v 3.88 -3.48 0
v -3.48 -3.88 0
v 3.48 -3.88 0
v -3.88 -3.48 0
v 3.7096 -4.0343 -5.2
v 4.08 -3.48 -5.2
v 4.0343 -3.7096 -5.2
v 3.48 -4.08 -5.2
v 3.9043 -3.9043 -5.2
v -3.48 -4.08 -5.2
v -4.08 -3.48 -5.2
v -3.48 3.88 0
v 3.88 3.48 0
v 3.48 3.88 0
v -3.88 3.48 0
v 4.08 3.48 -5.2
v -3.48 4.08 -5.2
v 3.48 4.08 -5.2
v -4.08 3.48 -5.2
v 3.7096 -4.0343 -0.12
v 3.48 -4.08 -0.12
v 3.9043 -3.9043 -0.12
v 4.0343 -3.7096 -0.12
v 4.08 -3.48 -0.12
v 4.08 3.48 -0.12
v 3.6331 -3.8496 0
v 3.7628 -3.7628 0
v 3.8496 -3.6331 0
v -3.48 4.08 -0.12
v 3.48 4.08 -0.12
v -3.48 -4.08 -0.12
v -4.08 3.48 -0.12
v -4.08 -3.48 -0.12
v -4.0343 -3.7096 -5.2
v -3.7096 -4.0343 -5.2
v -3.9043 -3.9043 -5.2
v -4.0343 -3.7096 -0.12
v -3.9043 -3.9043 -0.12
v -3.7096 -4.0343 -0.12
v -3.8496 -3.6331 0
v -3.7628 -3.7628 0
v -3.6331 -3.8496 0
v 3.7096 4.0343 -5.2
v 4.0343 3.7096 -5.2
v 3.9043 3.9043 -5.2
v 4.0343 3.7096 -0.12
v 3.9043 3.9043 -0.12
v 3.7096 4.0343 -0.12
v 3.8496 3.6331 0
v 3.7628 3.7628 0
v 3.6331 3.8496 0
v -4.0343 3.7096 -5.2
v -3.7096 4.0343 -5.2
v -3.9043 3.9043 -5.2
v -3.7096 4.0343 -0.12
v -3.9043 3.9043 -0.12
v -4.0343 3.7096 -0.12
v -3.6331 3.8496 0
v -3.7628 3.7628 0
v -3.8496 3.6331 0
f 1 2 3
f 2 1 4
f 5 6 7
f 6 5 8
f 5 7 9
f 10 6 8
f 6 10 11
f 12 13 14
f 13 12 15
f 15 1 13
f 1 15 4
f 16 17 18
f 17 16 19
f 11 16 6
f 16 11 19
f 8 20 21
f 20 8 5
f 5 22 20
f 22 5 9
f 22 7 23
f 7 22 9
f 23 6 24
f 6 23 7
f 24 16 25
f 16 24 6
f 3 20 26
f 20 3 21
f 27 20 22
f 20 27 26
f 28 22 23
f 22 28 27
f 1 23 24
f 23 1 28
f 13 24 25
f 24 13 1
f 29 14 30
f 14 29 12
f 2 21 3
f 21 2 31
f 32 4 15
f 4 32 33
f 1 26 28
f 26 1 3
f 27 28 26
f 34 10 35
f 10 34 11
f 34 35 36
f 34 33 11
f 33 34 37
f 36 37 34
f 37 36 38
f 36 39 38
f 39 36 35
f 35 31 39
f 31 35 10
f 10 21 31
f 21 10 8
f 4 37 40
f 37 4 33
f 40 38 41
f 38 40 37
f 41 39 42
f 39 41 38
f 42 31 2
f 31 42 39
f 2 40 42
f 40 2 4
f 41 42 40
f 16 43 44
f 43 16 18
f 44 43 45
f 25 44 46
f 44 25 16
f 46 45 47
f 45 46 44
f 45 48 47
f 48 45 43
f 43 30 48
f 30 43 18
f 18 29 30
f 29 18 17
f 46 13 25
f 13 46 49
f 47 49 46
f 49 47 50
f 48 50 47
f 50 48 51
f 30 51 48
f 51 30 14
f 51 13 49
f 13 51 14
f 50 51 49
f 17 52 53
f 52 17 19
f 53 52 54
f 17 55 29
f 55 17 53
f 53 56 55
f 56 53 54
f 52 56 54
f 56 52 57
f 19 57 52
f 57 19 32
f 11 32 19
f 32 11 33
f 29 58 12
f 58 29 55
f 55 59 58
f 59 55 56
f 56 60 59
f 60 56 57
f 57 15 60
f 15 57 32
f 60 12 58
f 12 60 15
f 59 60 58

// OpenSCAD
// file: ../p/1-4cyli.scad
use <../lib.scad>
function ldraw_lib__1_4cyli() = [
// 0 Cylinder 0.25
// 0 Name: 1-4cyli.dat
// 0 Author: James Jessiman
// 0 !LDRAW_ORG Primitive UPDATE 2012-01
// 0 !LICENSE Licensed under CC BY 2.0 and CC BY 4.0 : see CAreadme.txt
// 
// 0 BFC CERTIFY CCW
  [0,"BFC","CERTIFY"],
  [0,"BFC","CCW"],
// 
// 0 !HISTORY 2002-03-23 [sbliss] Added BFC statement.
// 0 !HISTORY 2002-04-25 [PTadmin] Official Update 2002-02
// 0 !HISTORY 2007-06-22 [PTadmin] Header formatted for Contributor Agreement
// 0 !HISTORY 2008-07-01 [PTadmin] Official Update 2008-01
// 0 !HISTORY 2012-02-16 [Philo] Changed to CCW
// 0 !HISTORY 2012-03-30 [PTadmin] Official Update 2012-01
// 
// 
// 4 16 1 1 0 0.9239 1 0.3827 0.9239 0 0.3827 1 0 0
  [4,16,1,1,0,0.9239,1,0.3827,0.9239,0,0.3827,1,0,0],
// 5 24 1 0 0 1 1 0 0.9239 0 0.3827 1 0 -1
  [5,24,1,0,0,1,1,0,0.9239,0,0.3827,1,0,-1],
// 4 16 0.9239 1 0.3827 0.7071 1 0.7071 0.7071 0 0.7071 0.9239 0 0.3827
  [4,16,0.9239,1,0.3827,0.7071,1,0.7071,0.7071,0,0.7071,0.9239,0,0.3827],
// 5 24 0.9239 0 0.3827 0.9239 1 0.3827 0.7071 0 0.7071 1 0 0
  [5,24,0.9239,0,0.3827,0.9239,1,0.3827,0.7071,0,0.7071,1,0,0],
// 4 16 0.7071 1 0.7071 0.3827 1 0.9239 0.3827 0 0.9239 0.7071 0 0.7071
  [4,16,0.7071,1,0.7071,0.3827,1,0.9239,0.3827,0,0.9239,0.7071,0,0.7071],
// 5 24 0.7071 0 0.7071 0.7071 1 0.7071 0.3827 0 0.9239 0.9239 0 0.3827
  [5,24,0.7071,0,0.7071,0.7071,1,0.7071,0.3827,0,0.9239,0.9239,0,0.3827],
// 4 16 0.3827 1 0.9239 0 1 1 0 0 1 0.3827 0 0.9239
  [4,16,0.3827,1,0.9239,0,1,1,0,0,1,0.3827,0,0.9239],
// 5 24 0.3827 0 0.9239 0.3827 1 0.9239 0 0 1 0.7071 0 0.7071
  [5,24,0.3827,0,0.9239,0.3827,1,0.9239,0,0,1,0.7071,0,0.7071],
// 5 24 0 0 1 0 1 1 0.3827 0 0.9239 -1 0 1
  [5,24,0,0,1,0,1,1,0.3827,0,0.9239,-1,0,1],
];
module ldraw_lib__1_4cyli(step=0, col=false, unit=2/5, alt=false, line=0.2, solid=!$preview)
    makepoly(ldraw_lib__1_4cyli(), step=step, col=col, unit=unit, alt=alt, line=line, solid=solid);
ldraw_lib__1_4cyli(line=0.2);
// file: ../p/rect2p.scad
use <../lib.scad>
function ldraw_lib__rect2p() = [
// 0 Rectangle with 2 Parallel Edges
// 0 Name: rect2p.dat
// 0 Author: Donald Sutter [technog]
// 0 !LDRAW_ORG Primitive UPDATE 2010-01
// 0 !LICENSE Licensed under CC BY 2.0 and CC BY 4.0 : see CAreadme.txt
// 
// 0 BFC CERTIFY CCW
  [0,"BFC","CERTIFY"],
  [0,"BFC","CCW"],
// 
// 0 !HISTORY 2003-08-01 [PTadmin] Official Update 2003-02
// 0 !HISTORY 2007-06-24 [PTadmin] Header formatted for Contributor Agreement
// 0 !HISTORY 2008-07-01 [PTadmin] Official Update 2008-01
// 0 !HISTORY 2010-01-17 [mikeheide] changed winding to CCW
// 0 !HISTORY 2010-04-05 [PTadmin] Official Update 2010-01
// 
// 
// 2 24 1 0 1 -1 0 1
  [2,24,1,0,1,-1,0,1],
// 2 24 -1 0 -1 1 0 -1
  [2,24,-1,0,-1,1,0,-1],
// 4 16 -1 0 1 -1 0 -1 1 0 -1 1 0 1
  [4,16,-1,0,1,-1,0,-1,1,0,-1,1,0,1],
// 0
];
module ldraw_lib__rect2p(step=0, col=false, unit=2/5, alt=false, line=0.2, solid=!$preview)
    makepoly(ldraw_lib__rect2p(), step=step, col=col, unit=unit, alt=alt, line=line, solid=solid);
ldraw_lib__rect2p(line=0.2);
// file: ../p/rect1.scad
use <../lib.scad>
function ldraw_lib__rect1() = [
// 0 Rectangle with 1 Edge
// 0 Name: rect1.dat
// 0 Author: Chris Dee [cwdee]
// 0 !LDRAW_ORG Primitive UPDATE 2010-01
// 0 !LICENSE Licensed under CC BY 2.0 and CC BY 4.0 : see CAreadme.txt
// 
// 0 BFC CERTIFY CCW
  [0,"BFC","CERTIFY"],
  [0,"BFC","CCW"],
// 
// 0 !HISTORY 2003-12-19 [PTadmin] Official Update 2003-03
// 0 !HISTORY 2007-06-24 [PTadmin] Header formatted for Contributor Agreement
// 0 !HISTORY 2008-07-01 [PTadmin] Official Update 2008-01
// 0 !HISTORY 2010-01-17 [mikeheide] changed winding to CCW
// 0 !HISTORY 2010-04-05 [PTadmin] Official Update 2010-01
// 
// 
// 2 24 1 0 -1 1 0 1
  [2,24,1,0,-1,1,0,1],
// 4 16 -1 0 1 -1 0 -1 1 0 -1 1 0 1
  [4,16,-1,0,1,-1,0,-1,1,0,-1,1,0,1],
// 0
];
module ldraw_lib__rect1(step=0, col=false, unit=2/5, alt=false, line=0.2, solid=!$preview)
    makepoly(ldraw_lib__rect1(), step=step, col=col, unit=unit, alt=alt, line=line, solid=solid);
ldraw_lib__rect1(line=0.2);
// file: ../p/1-4edge.scad
use <../lib.scad>
function ldraw_lib__1_4edge() = [
// 0 Circle 0.25
// 0 Name: 1-4edge.dat
// 0 Author: James Jessiman
// 0 !LDRAW_ORG Primitive UPDATE 2017-01
// 0 !LICENSE Licensed under CC BY 2.0 and CC BY 4.0 : see CAreadme.txt
// 
// 0 BFC CERTIFY CCW
  [0,"BFC","CERTIFY"],
  [0,"BFC","CCW"],
// 
// 0 !HISTORY 2007-06-22 [PTadmin] Header formatted for Contributor Agreement
// 0 !HISTORY 2008-07-01 [PTadmin] Official Update 2008-01
// 0 !HISTORY 2017-01-15 [Steffen] BFCed
// 0 !HISTORY 2017-12-30 [PTadmin] Official Update 2017-01
// 
// 
// 2 24 1 0 0 0.9239 0 0.3827
  [2,24,1,0,0,0.9239,0,0.3827],
// 2 24 0.9239 0 0.3827 0.7071 0 0.7071
  [2,24,0.9239,0,0.3827,0.7071,0,0.7071],
// 2 24 0.7071 0 0.7071 0.3827 0 0.9239
  [2,24,0.7071,0,0.7071,0.3827,0,0.9239],
// 2 24 0.3827 0 0.9239 0 0 1
  [2,24,0.3827,0,0.9239,0,0,1],
];
module ldraw_lib__1_4edge(step=0, col=false, unit=2/5, alt=false, line=0.2, solid=!$preview)
    makepoly(ldraw_lib__1_4edge(), step=step, col=col, unit=unit, alt=alt, line=line, solid=solid);
ldraw_lib__1_4edge(line=0.2);
// file: ../p/1-4cylo.scad
use <../lib.scad>
use <1-4cyli.scad>
use <1-4edge.scad>
function ldraw_lib__1_4cylo() = [
// 0 Cylinder Open 0.25
// 0 Name: 1-4cylo.dat
// 0 Author: Max Martin Richter [MMR1988]
// 0 !LDRAW_ORG Primitive UPDATE 2010-03
// 0 !LICENSE Licensed under CC BY 2.0 and CC BY 4.0 : see CAreadme.txt
// 
// 0 BFC CERTIFY CCW
  [0,"BFC","CERTIFY"],
  [0,"BFC","CCW"],
// 
// 0 !HISTORY 2010-12-31 [PTadmin] Official Update 2010-03
// 
// 
// 1 16 0 0 0 1 0 0 0 1 0 0 0 1 1-4edge.dat
  [1,16,0,0,0,1,0,0,0,1,0,0,0,1, ldraw_lib__1_4edge()],
// 1 16 0 1 0 1 0 0 0 1 0 0 0 1 1-4edge.dat
  [1,16,0,1,0,1,0,0,0,1,0,0,0,1, ldraw_lib__1_4edge()],
// 1 16 0 0 0 1 0 0 0 1 0 0 0 1 1-4cyli.dat
  [1,16,0,0,0,1,0,0,0,1,0,0,0,1, ldraw_lib__1_4cyli()],
];
module ldraw_lib__1_4cylo(step=0, col=false, unit=2/5, alt=false, line=0.2, solid=!$preview)
    makepoly(ldraw_lib__1_4cylo(), step=step, col=col, unit=unit, alt=alt, line=line, solid=solid);
ldraw_lib__1_4cylo(line=0.2);
// file: ../p/1-4con2.scad
use <../lib.scad>
function ldraw_lib__1_4con2() = [
// 0 Cone  2 x 0.25
// 0 Name: 1-4con2.dat
// 0 Author: Steve Bliss [sbliss]
// 0 !LDRAW_ORG Primitive UPDATE 2012-01
// 0 !LICENSE Licensed under CC BY 2.0 and CC BY 4.0 : see CAreadme.txt
// 
// 0 BFC CERTIFY CCW
  [0,"BFC","CERTIFY"],
  [0,"BFC","CCW"],
// 
// 0 !HISTORY 1999-07-05 [PTadmin] Official Update 1999-05
// 0 !HISTORY 2002-12-11 [cwdee] Standardised title and made BFC compliant
// 0 !HISTORY 2003-06-28 [pneaster] Added missing conditional line
// 0 !HISTORY 2003-12-19 [PTadmin] Official Update 2003-03
// 0 !HISTORY 2007-06-22 [PTadmin] Header formatted for Contributor Agreement
// 0 !HISTORY 2008-07-01 [PTadmin] Official Update 2008-01
// 0 !HISTORY 2012-02-16 [Philo] Recreated CCW
// 0 !HISTORY 2012-03-30 [PTadmin] Official Update 2012-01
// 
// 
// 4 16 2 1 0 1.8478 1 0.7654 2.7717 0 1.1481 3 0 0
  [4,16,2,1,0,1.8478,1,0.7654,2.7717,0,1.1481,3,0,0],
// 4 16 1.8478 1 0.7654 1.4142 1 1.4142 2.1213 0 2.1213 2.7717 0 1.1481
  [4,16,1.8478,1,0.7654,1.4142,1,1.4142,2.1213,0,2.1213,2.7717,0,1.1481],
// 4 16 1.4142 1 1.4142 0.7654 1 1.8478 1.1481 0 2.7717 2.1213 0 2.1213
  [4,16,1.4142,1,1.4142,0.7654,1,1.8478,1.1481,0,2.7717,2.1213,0,2.1213],
// 4 16 0.7654 1 1.8478 0 1 2 0 0 3 1.1481 0 2.7717
  [4,16,0.7654,1,1.8478,0,1,2,0,0,3,1.1481,0,2.7717],
// 0 // conditional lines
// 5 24 2 1 0 3 0 0 2 1 -0.8284 1.8478 1 0.7654
  [5,24,2,1,0,3,0,0,2,1,-0.8284,1.8478,1,0.7654],
// 5 24 1.8478 1 0.7654 2.7717 0 1.1481 2 1 0 1.4142 1 1.4142
  [5,24,1.8478,1,0.7654,2.7717,0,1.1481,2,1,0,1.4142,1,1.4142],
// 5 24 1.4142 1 1.4142 2.1213 0 2.1213 1.8478 1 0.7654 0.7654 1 1.8478
  [5,24,1.4142,1,1.4142,2.1213,0,2.1213,1.8478,1,0.7654,0.7654,1,1.8478],
// 5 24 0.7654 1 1.8478 1.1481 0 2.7717 1.4142 1 1.4142 0 1 2
  [5,24,0.7654,1,1.8478,1.1481,0,2.7717,1.4142,1,1.4142,0,1,2],
// 5 24 0 1 2 0 0 3 0.7654 1 1.8478 -0.8284 1 2
  [5,24,0,1,2,0,0,3,0.7654,1,1.8478,-0.8284,1,2],
// 0 // Build by Primitive Generator 2
];
module ldraw_lib__1_4con2(step=0, col=false, unit=2/5, alt=false, line=0.2, solid=!$preview)
    makepoly(ldraw_lib__1_4con2(), step=step, col=col, unit=unit, alt=alt, line=line, solid=solid);
ldraw_lib__1_4con2(line=0.2);
// file: ../p/1-4chrd.scad
use <../lib.scad>
function ldraw_lib__1_4chrd() = [
// 0 Chord 0.25
// 0 Name: 1-4chrd.dat
// 0 Author: Tony Hafner [hafhead]
// 0 !LDRAW_ORG Primitive UPDATE 2012-02
// 0 !LICENSE Licensed under CC BY 2.0 and CC BY 4.0 : see CAreadme.txt
// 
// 0 BFC CERTIFY CCW
  [0,"BFC","CERTIFY"],
  [0,"BFC","CCW"],
// 
// 0 !HISTORY 2004-04-22 [PTadmin] Official Update 2004-02
// 0 !HISTORY 2007-10-09 [PTadmin] Header formatted for Contributor Agreement
// 0 !HISTORY 2008-07-01 [PTadmin] Official Update 2008-01
// 0 !HISTORY 2012-08-02 [MMR1988] Re-creation with PrimGen2 and Rectifier
// 0 !HISTORY 2012-08-09 [PTadmin] Official Update 2012-02
// 
// 
// 4 16 0.9239 0 0.3827 0.3827 0 0.9239 0 0 1 1 0 0
  [4,16,0.9239,0,0.3827,0.3827,0,0.9239,0,0,1,1,0,0],
// 3 16 0.7071 0 0.7071 0.3827 0 0.9239 0.9239 0 0.3827
  [3,16,0.7071,0,0.7071,0.3827,0,0.9239,0.9239,0,0.3827],
];
module ldraw_lib__1_4chrd(step=0, col=false, unit=2/5, alt=false, line=0.2, solid=!$preview)
    makepoly(ldraw_lib__1_4chrd(), step=step, col=col, unit=unit, alt=alt, line=line, solid=solid);
ldraw_lib__1_4chrd(line=0.2);
// file: 99146.scad
use <../lib.scad>
use <../p/1-4chrd.scad>
use <../p/1-4con2.scad>
use <../p/1-4cylo.scad>
use <../p/1-4edge.scad>
use <../p/rect1.scad>
use <../p/rect2p.scad>
function ldraw_lib__99146() = [
// 0 ~Electric Mindstorms EV3 Square Button
// 0 Name: 99146.dat
// 0 Author: Philippe Hurbain [Philo]
// 0 !LDRAW_ORG Part UPDATE 2013-02
// 0 !LICENSE Licensed under CC BY 2.0 and CC BY 4.0 : see CAreadme.txt
// 
// 0 BFC CERTIFY CCW
  [0,"BFC","CERTIFY"],
  [0,"BFC","CCW"],
// 
// 0 !HISTORY 2012-05-20 {LEGO MINDSTORMS Team} Original part shape
// 0 !HISTORY 2012-06-09 [Philo] Complete rebuild for LDraw Parts Tracker
// 0 !HISTORY 2013-12-23 [PTadmin] Official Update 2013-02
// 
// 
// 4 16 8.7 0 -9.7 9.7 0 -8.7 -9.7 0 -8.7 -8.7 0 -9.7
  [4,16,8.7,0,-9.7,9.7,0,-8.7,-9.7,0,-8.7,-8.7,0,-9.7],
// 1 16 8.7 13 -8.7 0 0 1.5 0 -0.3 0 -1.5 0 0 1-4chrd.dat
  [1,16,8.7,13,-8.7,0,0,1.5,0,-0.3,0,-1.5,0,0, ldraw_lib__1_4chrd()],
// 4 16 -8.7 13 -10.2 -10.2 13 -8.7 10.2 13 -8.7 8.7 13 -10.2
  [4,16,-8.7,13,-10.2,-10.2,13,-8.7,10.2,13,-8.7,8.7,13,-10.2],
// 4 16 -8.7 0 9.7 -9.7 0 8.7 9.7 0 8.7 8.7 0 9.7
  [4,16,-8.7,0,9.7,-9.7,0,8.7,9.7,0,8.7,8.7,0,9.7],
// 1 16 0 0 0 0 0 -9.7 0 1 0 8.7 0 0 rect2p.dat
  [1,16,0,0,0,0,0,-9.7,0,1,0,8.7,0,0, ldraw_lib__rect2p()],
// 4 16 8.7 13 10.2 10.2 13 8.7 -10.2 13 8.7 -8.7 13 10.2
  [4,16,8.7,13,10.2,10.2,13,8.7,-10.2,13,8.7,-8.7,13,10.2],
// 4 16 -10.2 13 -8.7 -10.2 13 8.7 10.2 13 8.7 10.2 13 -8.7
  [4,16,-10.2,13,-8.7,-10.2,13,8.7,10.2,13,8.7,10.2,13,-8.7],
// 1 16 8.7 0.3 -8.7 0 0 1.5 0 12.7 0 -1.5 0 0 1-4cylo.dat
  [1,16,8.7,0.3,-8.7,0,0,1.5,0,12.7,0,-1.5,0,0, ldraw_lib__1_4cylo()],
// 1 16 10.2 6.65 0 0 -1 0 0 0 -6.35 8.7 0 0 rect2p.dat
  [1,16,10.2,6.65,0,0,-1,0,0,0,-6.35,8.7,0,0, ldraw_lib__rect2p()],
// 1 16 8.7 0.3 -8.7 0 0 0.5 0 -0.3 0 -0.5 0 0 1-4con2.dat
  [1,16,8.7,0.3,-8.7,0,0,0.5,0,-0.3,0,-0.5,0,0, ldraw_lib__1_4con2()],
// 1 16 8.7 0 -8.7 0 0 1 0 0.3 0 -1 0 0 1-4edge.dat
  [1,16,8.7,0,-8.7,0,0,1,0,0.3,0,-1,0,0, ldraw_lib__1_4edge()],
// 4 16 9.7 0 -8.7 10.2 0.3 -8.7 10.2 0.3 8.7 9.7 0 8.7
  [4,16,9.7,0,-8.7,10.2,0.3,-8.7,10.2,0.3,8.7,9.7,0,8.7],
// 1 16 0 0.15 9.95 0 0 8.7 -0.15 8.7 0 -0.25 -5.22 0 rect1.dat
  [1,16,0,0.15,9.95,0,0,8.7,-0.15,8.7,0,-0.25,-5.22,0, ldraw_lib__rect1()],
// 1 16 0 0.15 -9.95 0 0 -8.7 -0.15 8.7 0 0.25 5.22 0 rect1.dat
  [1,16,0,0.15,-9.95,0,0,-8.7,-0.15,8.7,0,0.25,5.22,0, ldraw_lib__rect1()],
// 4 16 -9.7 0 8.7 -10.2 0.3 8.7 -10.2 0.3 -8.7 -9.7 0 -8.7
  [4,16,-9.7,0,8.7,-10.2,0.3,8.7,-10.2,0.3,-8.7,-9.7,0,-8.7],
// 1 16 8.7 0 -8.7 0 0 1 0 0.3 0 -1 0 0 1-4chrd.dat
  [1,16,8.7,0,-8.7,0,0,1,0,0.3,0,-1,0,0, ldraw_lib__1_4chrd()],
// 1 16 -8.7 13 -8.7 -1.5 0 0 0 -0.3 0 0 0 -1.5 1-4chrd.dat
  [1,16,-8.7,13,-8.7,-1.5,0,0,0,-0.3,0,0,0,-1.5, ldraw_lib__1_4chrd()],
// 1 16 -8.7 0.3 -8.7 -1.5 0 0 0 12.7 0 0 0 -1.5 1-4cylo.dat
  [1,16,-8.7,0.3,-8.7,-1.5,0,0,0,12.7,0,0,0,-1.5, ldraw_lib__1_4cylo()],
// 1 16 0 6.65 -10.2 8.7 0 0 0 0 -6.35 0 1 0 rect2p.dat
  [1,16,0,6.65,-10.2,8.7,0,0,0,0,-6.35,0,1,0, ldraw_lib__rect2p()],
// 1 16 -8.7 0.3 -8.7 -0.5 0 0 0 -0.3 0 0 0 -0.5 1-4con2.dat
  [1,16,-8.7,0.3,-8.7,-0.5,0,0,0,-0.3,0,0,0,-0.5, ldraw_lib__1_4con2()],
// 1 16 -8.7 0 -8.7 -1 0 0 0 0.3 0 0 0 -1 1-4edge.dat
  [1,16,-8.7,0,-8.7,-1,0,0,0,0.3,0,0,0,-1, ldraw_lib__1_4edge()],
// 1 16 -8.7 0 -8.7 -1 0 0 0 0.3 0 0 0 -1 1-4chrd.dat
  [1,16,-8.7,0,-8.7,-1,0,0,0,0.3,0,0,0,-1, ldraw_lib__1_4chrd()],
// 1 16 8.7 13 8.7 1.5 0 0 0 -0.3 0 0 0 1.5 1-4chrd.dat
  [1,16,8.7,13,8.7,1.5,0,0,0,-0.3,0,0,0,1.5, ldraw_lib__1_4chrd()],
// 1 16 8.7 0.3 8.7 1.5 0 0 0 12.7 0 0 0 1.5 1-4cylo.dat
  [1,16,8.7,0.3,8.7,1.5,0,0,0,12.7,0,0,0,1.5, ldraw_lib__1_4cylo()],
// 1 16 0 6.65 10.2 -8.7 0 0 0 0 -6.35 0 -1 0 rect2p.dat
  [1,16,0,6.65,10.2,-8.7,0,0,0,0,-6.35,0,-1,0, ldraw_lib__rect2p()],
// 1 16 8.7 0.3 8.7 0.5 0 0 0 -0.3 0 0 0 0.5 1-4con2.dat
  [1,16,8.7,0.3,8.7,0.5,0,0,0,-0.3,0,0,0,0.5, ldraw_lib__1_4con2()],
// 1 16 8.7 0 8.7 1 0 0 0 0.3 0 0 0 1 1-4edge.dat
  [1,16,8.7,0,8.7,1,0,0,0,0.3,0,0,0,1, ldraw_lib__1_4edge()],
// 1 16 8.7 0 8.7 1 0 0 0 0.3 0 0 0 1 1-4chrd.dat
  [1,16,8.7,0,8.7,1,0,0,0,0.3,0,0,0,1, ldraw_lib__1_4chrd()],
// 1 16 -8.7 13 8.7 0 0 -1.5 0 -0.3 0 1.5 0 0 1-4chrd.dat
  [1,16,-8.7,13,8.7,0,0,-1.5,0,-0.3,0,1.5,0,0, ldraw_lib__1_4chrd()],
// 1 16 -8.7 0.3 8.7 0 0 -1.5 0 12.7 0 1.5 0 0 1-4cylo.dat
  [1,16,-8.7,0.3,8.7,0,0,-1.5,0,12.7,0,1.5,0,0, ldraw_lib__1_4cylo()],
// 1 16 -10.2 6.65 0 0 1 0 0 0 -6.35 -8.7 0 0 rect2p.dat
  [1,16,-10.2,6.65,0,0,1,0,0,0,-6.35,-8.7,0,0, ldraw_lib__rect2p()],
// 1 16 -8.7 0.3 8.7 0 0 -0.5 0 -0.3 0 0.5 0 0 1-4con2.dat
  [1,16,-8.7,0.3,8.7,0,0,-0.5,0,-0.3,0,0.5,0,0, ldraw_lib__1_4con2()],
// 1 16 -8.7 0 8.7 0 0 -1 0 0.3 0 1 0 0 1-4edge.dat
  [1,16,-8.7,0,8.7,0,0,-1,0,0.3,0,1,0,0, ldraw_lib__1_4edge()],
// 1 16 -8.7 0 8.7 0 0 -1 0 0.3 0 1 0 0 1-4chrd.dat
  [1,16,-8.7,0,8.7,0,0,-1,0,0.3,0,1,0,0, ldraw_lib__1_4chrd()],
];
module ldraw_lib__99146(step=0, col=false, unit=2/5, alt=false, line=0.2, solid=!$preview)
    makepoly(ldraw_lib__99146(), step=step, col=col, unit=unit, alt=alt, line=line, solid=solid);
ldraw_lib__99146(line=0.2);
// main file
use <../lib.scad>
use <99146.scad>
function ldraw_lib__89658() = [
// 0 ~Electric Energy Display On Button
// 0 Name: 89658.dat
// 0 Author: Philippe Hurbain [Philo]
// 0 !LDRAW_ORG Part UPDATE 2018-02
// 0 !LICENSE Licensed under CC BY 2.0 and CC BY 4.0 : see CAreadme.txt
// 
// 0 BFC CERTIFY CCW
  [0,"BFC","CERTIFY"],
  [0,"BFC","CCW"],
// 
// 0 !HISTORY 2018-12-08 [PTadmin] Official Update 2018-02
// 
// 
// 1 16 0 0 0 1 0 0 0 1 0 0 0 1 99146.dat
  [1,16,0,0,0,1,0,0,0,1,0,0,0,1, ldraw_lib__99146()],
];
module ldraw_lib__89658(step=0, col=false, unit=2/5, alt=false, line=0.2, solid=!$preview)
    makepoly(ldraw_lib__89658(), step=step, col=col, unit=unit, alt=alt, line=line, solid=solid);
ldraw_lib__89658(line=0.2);
